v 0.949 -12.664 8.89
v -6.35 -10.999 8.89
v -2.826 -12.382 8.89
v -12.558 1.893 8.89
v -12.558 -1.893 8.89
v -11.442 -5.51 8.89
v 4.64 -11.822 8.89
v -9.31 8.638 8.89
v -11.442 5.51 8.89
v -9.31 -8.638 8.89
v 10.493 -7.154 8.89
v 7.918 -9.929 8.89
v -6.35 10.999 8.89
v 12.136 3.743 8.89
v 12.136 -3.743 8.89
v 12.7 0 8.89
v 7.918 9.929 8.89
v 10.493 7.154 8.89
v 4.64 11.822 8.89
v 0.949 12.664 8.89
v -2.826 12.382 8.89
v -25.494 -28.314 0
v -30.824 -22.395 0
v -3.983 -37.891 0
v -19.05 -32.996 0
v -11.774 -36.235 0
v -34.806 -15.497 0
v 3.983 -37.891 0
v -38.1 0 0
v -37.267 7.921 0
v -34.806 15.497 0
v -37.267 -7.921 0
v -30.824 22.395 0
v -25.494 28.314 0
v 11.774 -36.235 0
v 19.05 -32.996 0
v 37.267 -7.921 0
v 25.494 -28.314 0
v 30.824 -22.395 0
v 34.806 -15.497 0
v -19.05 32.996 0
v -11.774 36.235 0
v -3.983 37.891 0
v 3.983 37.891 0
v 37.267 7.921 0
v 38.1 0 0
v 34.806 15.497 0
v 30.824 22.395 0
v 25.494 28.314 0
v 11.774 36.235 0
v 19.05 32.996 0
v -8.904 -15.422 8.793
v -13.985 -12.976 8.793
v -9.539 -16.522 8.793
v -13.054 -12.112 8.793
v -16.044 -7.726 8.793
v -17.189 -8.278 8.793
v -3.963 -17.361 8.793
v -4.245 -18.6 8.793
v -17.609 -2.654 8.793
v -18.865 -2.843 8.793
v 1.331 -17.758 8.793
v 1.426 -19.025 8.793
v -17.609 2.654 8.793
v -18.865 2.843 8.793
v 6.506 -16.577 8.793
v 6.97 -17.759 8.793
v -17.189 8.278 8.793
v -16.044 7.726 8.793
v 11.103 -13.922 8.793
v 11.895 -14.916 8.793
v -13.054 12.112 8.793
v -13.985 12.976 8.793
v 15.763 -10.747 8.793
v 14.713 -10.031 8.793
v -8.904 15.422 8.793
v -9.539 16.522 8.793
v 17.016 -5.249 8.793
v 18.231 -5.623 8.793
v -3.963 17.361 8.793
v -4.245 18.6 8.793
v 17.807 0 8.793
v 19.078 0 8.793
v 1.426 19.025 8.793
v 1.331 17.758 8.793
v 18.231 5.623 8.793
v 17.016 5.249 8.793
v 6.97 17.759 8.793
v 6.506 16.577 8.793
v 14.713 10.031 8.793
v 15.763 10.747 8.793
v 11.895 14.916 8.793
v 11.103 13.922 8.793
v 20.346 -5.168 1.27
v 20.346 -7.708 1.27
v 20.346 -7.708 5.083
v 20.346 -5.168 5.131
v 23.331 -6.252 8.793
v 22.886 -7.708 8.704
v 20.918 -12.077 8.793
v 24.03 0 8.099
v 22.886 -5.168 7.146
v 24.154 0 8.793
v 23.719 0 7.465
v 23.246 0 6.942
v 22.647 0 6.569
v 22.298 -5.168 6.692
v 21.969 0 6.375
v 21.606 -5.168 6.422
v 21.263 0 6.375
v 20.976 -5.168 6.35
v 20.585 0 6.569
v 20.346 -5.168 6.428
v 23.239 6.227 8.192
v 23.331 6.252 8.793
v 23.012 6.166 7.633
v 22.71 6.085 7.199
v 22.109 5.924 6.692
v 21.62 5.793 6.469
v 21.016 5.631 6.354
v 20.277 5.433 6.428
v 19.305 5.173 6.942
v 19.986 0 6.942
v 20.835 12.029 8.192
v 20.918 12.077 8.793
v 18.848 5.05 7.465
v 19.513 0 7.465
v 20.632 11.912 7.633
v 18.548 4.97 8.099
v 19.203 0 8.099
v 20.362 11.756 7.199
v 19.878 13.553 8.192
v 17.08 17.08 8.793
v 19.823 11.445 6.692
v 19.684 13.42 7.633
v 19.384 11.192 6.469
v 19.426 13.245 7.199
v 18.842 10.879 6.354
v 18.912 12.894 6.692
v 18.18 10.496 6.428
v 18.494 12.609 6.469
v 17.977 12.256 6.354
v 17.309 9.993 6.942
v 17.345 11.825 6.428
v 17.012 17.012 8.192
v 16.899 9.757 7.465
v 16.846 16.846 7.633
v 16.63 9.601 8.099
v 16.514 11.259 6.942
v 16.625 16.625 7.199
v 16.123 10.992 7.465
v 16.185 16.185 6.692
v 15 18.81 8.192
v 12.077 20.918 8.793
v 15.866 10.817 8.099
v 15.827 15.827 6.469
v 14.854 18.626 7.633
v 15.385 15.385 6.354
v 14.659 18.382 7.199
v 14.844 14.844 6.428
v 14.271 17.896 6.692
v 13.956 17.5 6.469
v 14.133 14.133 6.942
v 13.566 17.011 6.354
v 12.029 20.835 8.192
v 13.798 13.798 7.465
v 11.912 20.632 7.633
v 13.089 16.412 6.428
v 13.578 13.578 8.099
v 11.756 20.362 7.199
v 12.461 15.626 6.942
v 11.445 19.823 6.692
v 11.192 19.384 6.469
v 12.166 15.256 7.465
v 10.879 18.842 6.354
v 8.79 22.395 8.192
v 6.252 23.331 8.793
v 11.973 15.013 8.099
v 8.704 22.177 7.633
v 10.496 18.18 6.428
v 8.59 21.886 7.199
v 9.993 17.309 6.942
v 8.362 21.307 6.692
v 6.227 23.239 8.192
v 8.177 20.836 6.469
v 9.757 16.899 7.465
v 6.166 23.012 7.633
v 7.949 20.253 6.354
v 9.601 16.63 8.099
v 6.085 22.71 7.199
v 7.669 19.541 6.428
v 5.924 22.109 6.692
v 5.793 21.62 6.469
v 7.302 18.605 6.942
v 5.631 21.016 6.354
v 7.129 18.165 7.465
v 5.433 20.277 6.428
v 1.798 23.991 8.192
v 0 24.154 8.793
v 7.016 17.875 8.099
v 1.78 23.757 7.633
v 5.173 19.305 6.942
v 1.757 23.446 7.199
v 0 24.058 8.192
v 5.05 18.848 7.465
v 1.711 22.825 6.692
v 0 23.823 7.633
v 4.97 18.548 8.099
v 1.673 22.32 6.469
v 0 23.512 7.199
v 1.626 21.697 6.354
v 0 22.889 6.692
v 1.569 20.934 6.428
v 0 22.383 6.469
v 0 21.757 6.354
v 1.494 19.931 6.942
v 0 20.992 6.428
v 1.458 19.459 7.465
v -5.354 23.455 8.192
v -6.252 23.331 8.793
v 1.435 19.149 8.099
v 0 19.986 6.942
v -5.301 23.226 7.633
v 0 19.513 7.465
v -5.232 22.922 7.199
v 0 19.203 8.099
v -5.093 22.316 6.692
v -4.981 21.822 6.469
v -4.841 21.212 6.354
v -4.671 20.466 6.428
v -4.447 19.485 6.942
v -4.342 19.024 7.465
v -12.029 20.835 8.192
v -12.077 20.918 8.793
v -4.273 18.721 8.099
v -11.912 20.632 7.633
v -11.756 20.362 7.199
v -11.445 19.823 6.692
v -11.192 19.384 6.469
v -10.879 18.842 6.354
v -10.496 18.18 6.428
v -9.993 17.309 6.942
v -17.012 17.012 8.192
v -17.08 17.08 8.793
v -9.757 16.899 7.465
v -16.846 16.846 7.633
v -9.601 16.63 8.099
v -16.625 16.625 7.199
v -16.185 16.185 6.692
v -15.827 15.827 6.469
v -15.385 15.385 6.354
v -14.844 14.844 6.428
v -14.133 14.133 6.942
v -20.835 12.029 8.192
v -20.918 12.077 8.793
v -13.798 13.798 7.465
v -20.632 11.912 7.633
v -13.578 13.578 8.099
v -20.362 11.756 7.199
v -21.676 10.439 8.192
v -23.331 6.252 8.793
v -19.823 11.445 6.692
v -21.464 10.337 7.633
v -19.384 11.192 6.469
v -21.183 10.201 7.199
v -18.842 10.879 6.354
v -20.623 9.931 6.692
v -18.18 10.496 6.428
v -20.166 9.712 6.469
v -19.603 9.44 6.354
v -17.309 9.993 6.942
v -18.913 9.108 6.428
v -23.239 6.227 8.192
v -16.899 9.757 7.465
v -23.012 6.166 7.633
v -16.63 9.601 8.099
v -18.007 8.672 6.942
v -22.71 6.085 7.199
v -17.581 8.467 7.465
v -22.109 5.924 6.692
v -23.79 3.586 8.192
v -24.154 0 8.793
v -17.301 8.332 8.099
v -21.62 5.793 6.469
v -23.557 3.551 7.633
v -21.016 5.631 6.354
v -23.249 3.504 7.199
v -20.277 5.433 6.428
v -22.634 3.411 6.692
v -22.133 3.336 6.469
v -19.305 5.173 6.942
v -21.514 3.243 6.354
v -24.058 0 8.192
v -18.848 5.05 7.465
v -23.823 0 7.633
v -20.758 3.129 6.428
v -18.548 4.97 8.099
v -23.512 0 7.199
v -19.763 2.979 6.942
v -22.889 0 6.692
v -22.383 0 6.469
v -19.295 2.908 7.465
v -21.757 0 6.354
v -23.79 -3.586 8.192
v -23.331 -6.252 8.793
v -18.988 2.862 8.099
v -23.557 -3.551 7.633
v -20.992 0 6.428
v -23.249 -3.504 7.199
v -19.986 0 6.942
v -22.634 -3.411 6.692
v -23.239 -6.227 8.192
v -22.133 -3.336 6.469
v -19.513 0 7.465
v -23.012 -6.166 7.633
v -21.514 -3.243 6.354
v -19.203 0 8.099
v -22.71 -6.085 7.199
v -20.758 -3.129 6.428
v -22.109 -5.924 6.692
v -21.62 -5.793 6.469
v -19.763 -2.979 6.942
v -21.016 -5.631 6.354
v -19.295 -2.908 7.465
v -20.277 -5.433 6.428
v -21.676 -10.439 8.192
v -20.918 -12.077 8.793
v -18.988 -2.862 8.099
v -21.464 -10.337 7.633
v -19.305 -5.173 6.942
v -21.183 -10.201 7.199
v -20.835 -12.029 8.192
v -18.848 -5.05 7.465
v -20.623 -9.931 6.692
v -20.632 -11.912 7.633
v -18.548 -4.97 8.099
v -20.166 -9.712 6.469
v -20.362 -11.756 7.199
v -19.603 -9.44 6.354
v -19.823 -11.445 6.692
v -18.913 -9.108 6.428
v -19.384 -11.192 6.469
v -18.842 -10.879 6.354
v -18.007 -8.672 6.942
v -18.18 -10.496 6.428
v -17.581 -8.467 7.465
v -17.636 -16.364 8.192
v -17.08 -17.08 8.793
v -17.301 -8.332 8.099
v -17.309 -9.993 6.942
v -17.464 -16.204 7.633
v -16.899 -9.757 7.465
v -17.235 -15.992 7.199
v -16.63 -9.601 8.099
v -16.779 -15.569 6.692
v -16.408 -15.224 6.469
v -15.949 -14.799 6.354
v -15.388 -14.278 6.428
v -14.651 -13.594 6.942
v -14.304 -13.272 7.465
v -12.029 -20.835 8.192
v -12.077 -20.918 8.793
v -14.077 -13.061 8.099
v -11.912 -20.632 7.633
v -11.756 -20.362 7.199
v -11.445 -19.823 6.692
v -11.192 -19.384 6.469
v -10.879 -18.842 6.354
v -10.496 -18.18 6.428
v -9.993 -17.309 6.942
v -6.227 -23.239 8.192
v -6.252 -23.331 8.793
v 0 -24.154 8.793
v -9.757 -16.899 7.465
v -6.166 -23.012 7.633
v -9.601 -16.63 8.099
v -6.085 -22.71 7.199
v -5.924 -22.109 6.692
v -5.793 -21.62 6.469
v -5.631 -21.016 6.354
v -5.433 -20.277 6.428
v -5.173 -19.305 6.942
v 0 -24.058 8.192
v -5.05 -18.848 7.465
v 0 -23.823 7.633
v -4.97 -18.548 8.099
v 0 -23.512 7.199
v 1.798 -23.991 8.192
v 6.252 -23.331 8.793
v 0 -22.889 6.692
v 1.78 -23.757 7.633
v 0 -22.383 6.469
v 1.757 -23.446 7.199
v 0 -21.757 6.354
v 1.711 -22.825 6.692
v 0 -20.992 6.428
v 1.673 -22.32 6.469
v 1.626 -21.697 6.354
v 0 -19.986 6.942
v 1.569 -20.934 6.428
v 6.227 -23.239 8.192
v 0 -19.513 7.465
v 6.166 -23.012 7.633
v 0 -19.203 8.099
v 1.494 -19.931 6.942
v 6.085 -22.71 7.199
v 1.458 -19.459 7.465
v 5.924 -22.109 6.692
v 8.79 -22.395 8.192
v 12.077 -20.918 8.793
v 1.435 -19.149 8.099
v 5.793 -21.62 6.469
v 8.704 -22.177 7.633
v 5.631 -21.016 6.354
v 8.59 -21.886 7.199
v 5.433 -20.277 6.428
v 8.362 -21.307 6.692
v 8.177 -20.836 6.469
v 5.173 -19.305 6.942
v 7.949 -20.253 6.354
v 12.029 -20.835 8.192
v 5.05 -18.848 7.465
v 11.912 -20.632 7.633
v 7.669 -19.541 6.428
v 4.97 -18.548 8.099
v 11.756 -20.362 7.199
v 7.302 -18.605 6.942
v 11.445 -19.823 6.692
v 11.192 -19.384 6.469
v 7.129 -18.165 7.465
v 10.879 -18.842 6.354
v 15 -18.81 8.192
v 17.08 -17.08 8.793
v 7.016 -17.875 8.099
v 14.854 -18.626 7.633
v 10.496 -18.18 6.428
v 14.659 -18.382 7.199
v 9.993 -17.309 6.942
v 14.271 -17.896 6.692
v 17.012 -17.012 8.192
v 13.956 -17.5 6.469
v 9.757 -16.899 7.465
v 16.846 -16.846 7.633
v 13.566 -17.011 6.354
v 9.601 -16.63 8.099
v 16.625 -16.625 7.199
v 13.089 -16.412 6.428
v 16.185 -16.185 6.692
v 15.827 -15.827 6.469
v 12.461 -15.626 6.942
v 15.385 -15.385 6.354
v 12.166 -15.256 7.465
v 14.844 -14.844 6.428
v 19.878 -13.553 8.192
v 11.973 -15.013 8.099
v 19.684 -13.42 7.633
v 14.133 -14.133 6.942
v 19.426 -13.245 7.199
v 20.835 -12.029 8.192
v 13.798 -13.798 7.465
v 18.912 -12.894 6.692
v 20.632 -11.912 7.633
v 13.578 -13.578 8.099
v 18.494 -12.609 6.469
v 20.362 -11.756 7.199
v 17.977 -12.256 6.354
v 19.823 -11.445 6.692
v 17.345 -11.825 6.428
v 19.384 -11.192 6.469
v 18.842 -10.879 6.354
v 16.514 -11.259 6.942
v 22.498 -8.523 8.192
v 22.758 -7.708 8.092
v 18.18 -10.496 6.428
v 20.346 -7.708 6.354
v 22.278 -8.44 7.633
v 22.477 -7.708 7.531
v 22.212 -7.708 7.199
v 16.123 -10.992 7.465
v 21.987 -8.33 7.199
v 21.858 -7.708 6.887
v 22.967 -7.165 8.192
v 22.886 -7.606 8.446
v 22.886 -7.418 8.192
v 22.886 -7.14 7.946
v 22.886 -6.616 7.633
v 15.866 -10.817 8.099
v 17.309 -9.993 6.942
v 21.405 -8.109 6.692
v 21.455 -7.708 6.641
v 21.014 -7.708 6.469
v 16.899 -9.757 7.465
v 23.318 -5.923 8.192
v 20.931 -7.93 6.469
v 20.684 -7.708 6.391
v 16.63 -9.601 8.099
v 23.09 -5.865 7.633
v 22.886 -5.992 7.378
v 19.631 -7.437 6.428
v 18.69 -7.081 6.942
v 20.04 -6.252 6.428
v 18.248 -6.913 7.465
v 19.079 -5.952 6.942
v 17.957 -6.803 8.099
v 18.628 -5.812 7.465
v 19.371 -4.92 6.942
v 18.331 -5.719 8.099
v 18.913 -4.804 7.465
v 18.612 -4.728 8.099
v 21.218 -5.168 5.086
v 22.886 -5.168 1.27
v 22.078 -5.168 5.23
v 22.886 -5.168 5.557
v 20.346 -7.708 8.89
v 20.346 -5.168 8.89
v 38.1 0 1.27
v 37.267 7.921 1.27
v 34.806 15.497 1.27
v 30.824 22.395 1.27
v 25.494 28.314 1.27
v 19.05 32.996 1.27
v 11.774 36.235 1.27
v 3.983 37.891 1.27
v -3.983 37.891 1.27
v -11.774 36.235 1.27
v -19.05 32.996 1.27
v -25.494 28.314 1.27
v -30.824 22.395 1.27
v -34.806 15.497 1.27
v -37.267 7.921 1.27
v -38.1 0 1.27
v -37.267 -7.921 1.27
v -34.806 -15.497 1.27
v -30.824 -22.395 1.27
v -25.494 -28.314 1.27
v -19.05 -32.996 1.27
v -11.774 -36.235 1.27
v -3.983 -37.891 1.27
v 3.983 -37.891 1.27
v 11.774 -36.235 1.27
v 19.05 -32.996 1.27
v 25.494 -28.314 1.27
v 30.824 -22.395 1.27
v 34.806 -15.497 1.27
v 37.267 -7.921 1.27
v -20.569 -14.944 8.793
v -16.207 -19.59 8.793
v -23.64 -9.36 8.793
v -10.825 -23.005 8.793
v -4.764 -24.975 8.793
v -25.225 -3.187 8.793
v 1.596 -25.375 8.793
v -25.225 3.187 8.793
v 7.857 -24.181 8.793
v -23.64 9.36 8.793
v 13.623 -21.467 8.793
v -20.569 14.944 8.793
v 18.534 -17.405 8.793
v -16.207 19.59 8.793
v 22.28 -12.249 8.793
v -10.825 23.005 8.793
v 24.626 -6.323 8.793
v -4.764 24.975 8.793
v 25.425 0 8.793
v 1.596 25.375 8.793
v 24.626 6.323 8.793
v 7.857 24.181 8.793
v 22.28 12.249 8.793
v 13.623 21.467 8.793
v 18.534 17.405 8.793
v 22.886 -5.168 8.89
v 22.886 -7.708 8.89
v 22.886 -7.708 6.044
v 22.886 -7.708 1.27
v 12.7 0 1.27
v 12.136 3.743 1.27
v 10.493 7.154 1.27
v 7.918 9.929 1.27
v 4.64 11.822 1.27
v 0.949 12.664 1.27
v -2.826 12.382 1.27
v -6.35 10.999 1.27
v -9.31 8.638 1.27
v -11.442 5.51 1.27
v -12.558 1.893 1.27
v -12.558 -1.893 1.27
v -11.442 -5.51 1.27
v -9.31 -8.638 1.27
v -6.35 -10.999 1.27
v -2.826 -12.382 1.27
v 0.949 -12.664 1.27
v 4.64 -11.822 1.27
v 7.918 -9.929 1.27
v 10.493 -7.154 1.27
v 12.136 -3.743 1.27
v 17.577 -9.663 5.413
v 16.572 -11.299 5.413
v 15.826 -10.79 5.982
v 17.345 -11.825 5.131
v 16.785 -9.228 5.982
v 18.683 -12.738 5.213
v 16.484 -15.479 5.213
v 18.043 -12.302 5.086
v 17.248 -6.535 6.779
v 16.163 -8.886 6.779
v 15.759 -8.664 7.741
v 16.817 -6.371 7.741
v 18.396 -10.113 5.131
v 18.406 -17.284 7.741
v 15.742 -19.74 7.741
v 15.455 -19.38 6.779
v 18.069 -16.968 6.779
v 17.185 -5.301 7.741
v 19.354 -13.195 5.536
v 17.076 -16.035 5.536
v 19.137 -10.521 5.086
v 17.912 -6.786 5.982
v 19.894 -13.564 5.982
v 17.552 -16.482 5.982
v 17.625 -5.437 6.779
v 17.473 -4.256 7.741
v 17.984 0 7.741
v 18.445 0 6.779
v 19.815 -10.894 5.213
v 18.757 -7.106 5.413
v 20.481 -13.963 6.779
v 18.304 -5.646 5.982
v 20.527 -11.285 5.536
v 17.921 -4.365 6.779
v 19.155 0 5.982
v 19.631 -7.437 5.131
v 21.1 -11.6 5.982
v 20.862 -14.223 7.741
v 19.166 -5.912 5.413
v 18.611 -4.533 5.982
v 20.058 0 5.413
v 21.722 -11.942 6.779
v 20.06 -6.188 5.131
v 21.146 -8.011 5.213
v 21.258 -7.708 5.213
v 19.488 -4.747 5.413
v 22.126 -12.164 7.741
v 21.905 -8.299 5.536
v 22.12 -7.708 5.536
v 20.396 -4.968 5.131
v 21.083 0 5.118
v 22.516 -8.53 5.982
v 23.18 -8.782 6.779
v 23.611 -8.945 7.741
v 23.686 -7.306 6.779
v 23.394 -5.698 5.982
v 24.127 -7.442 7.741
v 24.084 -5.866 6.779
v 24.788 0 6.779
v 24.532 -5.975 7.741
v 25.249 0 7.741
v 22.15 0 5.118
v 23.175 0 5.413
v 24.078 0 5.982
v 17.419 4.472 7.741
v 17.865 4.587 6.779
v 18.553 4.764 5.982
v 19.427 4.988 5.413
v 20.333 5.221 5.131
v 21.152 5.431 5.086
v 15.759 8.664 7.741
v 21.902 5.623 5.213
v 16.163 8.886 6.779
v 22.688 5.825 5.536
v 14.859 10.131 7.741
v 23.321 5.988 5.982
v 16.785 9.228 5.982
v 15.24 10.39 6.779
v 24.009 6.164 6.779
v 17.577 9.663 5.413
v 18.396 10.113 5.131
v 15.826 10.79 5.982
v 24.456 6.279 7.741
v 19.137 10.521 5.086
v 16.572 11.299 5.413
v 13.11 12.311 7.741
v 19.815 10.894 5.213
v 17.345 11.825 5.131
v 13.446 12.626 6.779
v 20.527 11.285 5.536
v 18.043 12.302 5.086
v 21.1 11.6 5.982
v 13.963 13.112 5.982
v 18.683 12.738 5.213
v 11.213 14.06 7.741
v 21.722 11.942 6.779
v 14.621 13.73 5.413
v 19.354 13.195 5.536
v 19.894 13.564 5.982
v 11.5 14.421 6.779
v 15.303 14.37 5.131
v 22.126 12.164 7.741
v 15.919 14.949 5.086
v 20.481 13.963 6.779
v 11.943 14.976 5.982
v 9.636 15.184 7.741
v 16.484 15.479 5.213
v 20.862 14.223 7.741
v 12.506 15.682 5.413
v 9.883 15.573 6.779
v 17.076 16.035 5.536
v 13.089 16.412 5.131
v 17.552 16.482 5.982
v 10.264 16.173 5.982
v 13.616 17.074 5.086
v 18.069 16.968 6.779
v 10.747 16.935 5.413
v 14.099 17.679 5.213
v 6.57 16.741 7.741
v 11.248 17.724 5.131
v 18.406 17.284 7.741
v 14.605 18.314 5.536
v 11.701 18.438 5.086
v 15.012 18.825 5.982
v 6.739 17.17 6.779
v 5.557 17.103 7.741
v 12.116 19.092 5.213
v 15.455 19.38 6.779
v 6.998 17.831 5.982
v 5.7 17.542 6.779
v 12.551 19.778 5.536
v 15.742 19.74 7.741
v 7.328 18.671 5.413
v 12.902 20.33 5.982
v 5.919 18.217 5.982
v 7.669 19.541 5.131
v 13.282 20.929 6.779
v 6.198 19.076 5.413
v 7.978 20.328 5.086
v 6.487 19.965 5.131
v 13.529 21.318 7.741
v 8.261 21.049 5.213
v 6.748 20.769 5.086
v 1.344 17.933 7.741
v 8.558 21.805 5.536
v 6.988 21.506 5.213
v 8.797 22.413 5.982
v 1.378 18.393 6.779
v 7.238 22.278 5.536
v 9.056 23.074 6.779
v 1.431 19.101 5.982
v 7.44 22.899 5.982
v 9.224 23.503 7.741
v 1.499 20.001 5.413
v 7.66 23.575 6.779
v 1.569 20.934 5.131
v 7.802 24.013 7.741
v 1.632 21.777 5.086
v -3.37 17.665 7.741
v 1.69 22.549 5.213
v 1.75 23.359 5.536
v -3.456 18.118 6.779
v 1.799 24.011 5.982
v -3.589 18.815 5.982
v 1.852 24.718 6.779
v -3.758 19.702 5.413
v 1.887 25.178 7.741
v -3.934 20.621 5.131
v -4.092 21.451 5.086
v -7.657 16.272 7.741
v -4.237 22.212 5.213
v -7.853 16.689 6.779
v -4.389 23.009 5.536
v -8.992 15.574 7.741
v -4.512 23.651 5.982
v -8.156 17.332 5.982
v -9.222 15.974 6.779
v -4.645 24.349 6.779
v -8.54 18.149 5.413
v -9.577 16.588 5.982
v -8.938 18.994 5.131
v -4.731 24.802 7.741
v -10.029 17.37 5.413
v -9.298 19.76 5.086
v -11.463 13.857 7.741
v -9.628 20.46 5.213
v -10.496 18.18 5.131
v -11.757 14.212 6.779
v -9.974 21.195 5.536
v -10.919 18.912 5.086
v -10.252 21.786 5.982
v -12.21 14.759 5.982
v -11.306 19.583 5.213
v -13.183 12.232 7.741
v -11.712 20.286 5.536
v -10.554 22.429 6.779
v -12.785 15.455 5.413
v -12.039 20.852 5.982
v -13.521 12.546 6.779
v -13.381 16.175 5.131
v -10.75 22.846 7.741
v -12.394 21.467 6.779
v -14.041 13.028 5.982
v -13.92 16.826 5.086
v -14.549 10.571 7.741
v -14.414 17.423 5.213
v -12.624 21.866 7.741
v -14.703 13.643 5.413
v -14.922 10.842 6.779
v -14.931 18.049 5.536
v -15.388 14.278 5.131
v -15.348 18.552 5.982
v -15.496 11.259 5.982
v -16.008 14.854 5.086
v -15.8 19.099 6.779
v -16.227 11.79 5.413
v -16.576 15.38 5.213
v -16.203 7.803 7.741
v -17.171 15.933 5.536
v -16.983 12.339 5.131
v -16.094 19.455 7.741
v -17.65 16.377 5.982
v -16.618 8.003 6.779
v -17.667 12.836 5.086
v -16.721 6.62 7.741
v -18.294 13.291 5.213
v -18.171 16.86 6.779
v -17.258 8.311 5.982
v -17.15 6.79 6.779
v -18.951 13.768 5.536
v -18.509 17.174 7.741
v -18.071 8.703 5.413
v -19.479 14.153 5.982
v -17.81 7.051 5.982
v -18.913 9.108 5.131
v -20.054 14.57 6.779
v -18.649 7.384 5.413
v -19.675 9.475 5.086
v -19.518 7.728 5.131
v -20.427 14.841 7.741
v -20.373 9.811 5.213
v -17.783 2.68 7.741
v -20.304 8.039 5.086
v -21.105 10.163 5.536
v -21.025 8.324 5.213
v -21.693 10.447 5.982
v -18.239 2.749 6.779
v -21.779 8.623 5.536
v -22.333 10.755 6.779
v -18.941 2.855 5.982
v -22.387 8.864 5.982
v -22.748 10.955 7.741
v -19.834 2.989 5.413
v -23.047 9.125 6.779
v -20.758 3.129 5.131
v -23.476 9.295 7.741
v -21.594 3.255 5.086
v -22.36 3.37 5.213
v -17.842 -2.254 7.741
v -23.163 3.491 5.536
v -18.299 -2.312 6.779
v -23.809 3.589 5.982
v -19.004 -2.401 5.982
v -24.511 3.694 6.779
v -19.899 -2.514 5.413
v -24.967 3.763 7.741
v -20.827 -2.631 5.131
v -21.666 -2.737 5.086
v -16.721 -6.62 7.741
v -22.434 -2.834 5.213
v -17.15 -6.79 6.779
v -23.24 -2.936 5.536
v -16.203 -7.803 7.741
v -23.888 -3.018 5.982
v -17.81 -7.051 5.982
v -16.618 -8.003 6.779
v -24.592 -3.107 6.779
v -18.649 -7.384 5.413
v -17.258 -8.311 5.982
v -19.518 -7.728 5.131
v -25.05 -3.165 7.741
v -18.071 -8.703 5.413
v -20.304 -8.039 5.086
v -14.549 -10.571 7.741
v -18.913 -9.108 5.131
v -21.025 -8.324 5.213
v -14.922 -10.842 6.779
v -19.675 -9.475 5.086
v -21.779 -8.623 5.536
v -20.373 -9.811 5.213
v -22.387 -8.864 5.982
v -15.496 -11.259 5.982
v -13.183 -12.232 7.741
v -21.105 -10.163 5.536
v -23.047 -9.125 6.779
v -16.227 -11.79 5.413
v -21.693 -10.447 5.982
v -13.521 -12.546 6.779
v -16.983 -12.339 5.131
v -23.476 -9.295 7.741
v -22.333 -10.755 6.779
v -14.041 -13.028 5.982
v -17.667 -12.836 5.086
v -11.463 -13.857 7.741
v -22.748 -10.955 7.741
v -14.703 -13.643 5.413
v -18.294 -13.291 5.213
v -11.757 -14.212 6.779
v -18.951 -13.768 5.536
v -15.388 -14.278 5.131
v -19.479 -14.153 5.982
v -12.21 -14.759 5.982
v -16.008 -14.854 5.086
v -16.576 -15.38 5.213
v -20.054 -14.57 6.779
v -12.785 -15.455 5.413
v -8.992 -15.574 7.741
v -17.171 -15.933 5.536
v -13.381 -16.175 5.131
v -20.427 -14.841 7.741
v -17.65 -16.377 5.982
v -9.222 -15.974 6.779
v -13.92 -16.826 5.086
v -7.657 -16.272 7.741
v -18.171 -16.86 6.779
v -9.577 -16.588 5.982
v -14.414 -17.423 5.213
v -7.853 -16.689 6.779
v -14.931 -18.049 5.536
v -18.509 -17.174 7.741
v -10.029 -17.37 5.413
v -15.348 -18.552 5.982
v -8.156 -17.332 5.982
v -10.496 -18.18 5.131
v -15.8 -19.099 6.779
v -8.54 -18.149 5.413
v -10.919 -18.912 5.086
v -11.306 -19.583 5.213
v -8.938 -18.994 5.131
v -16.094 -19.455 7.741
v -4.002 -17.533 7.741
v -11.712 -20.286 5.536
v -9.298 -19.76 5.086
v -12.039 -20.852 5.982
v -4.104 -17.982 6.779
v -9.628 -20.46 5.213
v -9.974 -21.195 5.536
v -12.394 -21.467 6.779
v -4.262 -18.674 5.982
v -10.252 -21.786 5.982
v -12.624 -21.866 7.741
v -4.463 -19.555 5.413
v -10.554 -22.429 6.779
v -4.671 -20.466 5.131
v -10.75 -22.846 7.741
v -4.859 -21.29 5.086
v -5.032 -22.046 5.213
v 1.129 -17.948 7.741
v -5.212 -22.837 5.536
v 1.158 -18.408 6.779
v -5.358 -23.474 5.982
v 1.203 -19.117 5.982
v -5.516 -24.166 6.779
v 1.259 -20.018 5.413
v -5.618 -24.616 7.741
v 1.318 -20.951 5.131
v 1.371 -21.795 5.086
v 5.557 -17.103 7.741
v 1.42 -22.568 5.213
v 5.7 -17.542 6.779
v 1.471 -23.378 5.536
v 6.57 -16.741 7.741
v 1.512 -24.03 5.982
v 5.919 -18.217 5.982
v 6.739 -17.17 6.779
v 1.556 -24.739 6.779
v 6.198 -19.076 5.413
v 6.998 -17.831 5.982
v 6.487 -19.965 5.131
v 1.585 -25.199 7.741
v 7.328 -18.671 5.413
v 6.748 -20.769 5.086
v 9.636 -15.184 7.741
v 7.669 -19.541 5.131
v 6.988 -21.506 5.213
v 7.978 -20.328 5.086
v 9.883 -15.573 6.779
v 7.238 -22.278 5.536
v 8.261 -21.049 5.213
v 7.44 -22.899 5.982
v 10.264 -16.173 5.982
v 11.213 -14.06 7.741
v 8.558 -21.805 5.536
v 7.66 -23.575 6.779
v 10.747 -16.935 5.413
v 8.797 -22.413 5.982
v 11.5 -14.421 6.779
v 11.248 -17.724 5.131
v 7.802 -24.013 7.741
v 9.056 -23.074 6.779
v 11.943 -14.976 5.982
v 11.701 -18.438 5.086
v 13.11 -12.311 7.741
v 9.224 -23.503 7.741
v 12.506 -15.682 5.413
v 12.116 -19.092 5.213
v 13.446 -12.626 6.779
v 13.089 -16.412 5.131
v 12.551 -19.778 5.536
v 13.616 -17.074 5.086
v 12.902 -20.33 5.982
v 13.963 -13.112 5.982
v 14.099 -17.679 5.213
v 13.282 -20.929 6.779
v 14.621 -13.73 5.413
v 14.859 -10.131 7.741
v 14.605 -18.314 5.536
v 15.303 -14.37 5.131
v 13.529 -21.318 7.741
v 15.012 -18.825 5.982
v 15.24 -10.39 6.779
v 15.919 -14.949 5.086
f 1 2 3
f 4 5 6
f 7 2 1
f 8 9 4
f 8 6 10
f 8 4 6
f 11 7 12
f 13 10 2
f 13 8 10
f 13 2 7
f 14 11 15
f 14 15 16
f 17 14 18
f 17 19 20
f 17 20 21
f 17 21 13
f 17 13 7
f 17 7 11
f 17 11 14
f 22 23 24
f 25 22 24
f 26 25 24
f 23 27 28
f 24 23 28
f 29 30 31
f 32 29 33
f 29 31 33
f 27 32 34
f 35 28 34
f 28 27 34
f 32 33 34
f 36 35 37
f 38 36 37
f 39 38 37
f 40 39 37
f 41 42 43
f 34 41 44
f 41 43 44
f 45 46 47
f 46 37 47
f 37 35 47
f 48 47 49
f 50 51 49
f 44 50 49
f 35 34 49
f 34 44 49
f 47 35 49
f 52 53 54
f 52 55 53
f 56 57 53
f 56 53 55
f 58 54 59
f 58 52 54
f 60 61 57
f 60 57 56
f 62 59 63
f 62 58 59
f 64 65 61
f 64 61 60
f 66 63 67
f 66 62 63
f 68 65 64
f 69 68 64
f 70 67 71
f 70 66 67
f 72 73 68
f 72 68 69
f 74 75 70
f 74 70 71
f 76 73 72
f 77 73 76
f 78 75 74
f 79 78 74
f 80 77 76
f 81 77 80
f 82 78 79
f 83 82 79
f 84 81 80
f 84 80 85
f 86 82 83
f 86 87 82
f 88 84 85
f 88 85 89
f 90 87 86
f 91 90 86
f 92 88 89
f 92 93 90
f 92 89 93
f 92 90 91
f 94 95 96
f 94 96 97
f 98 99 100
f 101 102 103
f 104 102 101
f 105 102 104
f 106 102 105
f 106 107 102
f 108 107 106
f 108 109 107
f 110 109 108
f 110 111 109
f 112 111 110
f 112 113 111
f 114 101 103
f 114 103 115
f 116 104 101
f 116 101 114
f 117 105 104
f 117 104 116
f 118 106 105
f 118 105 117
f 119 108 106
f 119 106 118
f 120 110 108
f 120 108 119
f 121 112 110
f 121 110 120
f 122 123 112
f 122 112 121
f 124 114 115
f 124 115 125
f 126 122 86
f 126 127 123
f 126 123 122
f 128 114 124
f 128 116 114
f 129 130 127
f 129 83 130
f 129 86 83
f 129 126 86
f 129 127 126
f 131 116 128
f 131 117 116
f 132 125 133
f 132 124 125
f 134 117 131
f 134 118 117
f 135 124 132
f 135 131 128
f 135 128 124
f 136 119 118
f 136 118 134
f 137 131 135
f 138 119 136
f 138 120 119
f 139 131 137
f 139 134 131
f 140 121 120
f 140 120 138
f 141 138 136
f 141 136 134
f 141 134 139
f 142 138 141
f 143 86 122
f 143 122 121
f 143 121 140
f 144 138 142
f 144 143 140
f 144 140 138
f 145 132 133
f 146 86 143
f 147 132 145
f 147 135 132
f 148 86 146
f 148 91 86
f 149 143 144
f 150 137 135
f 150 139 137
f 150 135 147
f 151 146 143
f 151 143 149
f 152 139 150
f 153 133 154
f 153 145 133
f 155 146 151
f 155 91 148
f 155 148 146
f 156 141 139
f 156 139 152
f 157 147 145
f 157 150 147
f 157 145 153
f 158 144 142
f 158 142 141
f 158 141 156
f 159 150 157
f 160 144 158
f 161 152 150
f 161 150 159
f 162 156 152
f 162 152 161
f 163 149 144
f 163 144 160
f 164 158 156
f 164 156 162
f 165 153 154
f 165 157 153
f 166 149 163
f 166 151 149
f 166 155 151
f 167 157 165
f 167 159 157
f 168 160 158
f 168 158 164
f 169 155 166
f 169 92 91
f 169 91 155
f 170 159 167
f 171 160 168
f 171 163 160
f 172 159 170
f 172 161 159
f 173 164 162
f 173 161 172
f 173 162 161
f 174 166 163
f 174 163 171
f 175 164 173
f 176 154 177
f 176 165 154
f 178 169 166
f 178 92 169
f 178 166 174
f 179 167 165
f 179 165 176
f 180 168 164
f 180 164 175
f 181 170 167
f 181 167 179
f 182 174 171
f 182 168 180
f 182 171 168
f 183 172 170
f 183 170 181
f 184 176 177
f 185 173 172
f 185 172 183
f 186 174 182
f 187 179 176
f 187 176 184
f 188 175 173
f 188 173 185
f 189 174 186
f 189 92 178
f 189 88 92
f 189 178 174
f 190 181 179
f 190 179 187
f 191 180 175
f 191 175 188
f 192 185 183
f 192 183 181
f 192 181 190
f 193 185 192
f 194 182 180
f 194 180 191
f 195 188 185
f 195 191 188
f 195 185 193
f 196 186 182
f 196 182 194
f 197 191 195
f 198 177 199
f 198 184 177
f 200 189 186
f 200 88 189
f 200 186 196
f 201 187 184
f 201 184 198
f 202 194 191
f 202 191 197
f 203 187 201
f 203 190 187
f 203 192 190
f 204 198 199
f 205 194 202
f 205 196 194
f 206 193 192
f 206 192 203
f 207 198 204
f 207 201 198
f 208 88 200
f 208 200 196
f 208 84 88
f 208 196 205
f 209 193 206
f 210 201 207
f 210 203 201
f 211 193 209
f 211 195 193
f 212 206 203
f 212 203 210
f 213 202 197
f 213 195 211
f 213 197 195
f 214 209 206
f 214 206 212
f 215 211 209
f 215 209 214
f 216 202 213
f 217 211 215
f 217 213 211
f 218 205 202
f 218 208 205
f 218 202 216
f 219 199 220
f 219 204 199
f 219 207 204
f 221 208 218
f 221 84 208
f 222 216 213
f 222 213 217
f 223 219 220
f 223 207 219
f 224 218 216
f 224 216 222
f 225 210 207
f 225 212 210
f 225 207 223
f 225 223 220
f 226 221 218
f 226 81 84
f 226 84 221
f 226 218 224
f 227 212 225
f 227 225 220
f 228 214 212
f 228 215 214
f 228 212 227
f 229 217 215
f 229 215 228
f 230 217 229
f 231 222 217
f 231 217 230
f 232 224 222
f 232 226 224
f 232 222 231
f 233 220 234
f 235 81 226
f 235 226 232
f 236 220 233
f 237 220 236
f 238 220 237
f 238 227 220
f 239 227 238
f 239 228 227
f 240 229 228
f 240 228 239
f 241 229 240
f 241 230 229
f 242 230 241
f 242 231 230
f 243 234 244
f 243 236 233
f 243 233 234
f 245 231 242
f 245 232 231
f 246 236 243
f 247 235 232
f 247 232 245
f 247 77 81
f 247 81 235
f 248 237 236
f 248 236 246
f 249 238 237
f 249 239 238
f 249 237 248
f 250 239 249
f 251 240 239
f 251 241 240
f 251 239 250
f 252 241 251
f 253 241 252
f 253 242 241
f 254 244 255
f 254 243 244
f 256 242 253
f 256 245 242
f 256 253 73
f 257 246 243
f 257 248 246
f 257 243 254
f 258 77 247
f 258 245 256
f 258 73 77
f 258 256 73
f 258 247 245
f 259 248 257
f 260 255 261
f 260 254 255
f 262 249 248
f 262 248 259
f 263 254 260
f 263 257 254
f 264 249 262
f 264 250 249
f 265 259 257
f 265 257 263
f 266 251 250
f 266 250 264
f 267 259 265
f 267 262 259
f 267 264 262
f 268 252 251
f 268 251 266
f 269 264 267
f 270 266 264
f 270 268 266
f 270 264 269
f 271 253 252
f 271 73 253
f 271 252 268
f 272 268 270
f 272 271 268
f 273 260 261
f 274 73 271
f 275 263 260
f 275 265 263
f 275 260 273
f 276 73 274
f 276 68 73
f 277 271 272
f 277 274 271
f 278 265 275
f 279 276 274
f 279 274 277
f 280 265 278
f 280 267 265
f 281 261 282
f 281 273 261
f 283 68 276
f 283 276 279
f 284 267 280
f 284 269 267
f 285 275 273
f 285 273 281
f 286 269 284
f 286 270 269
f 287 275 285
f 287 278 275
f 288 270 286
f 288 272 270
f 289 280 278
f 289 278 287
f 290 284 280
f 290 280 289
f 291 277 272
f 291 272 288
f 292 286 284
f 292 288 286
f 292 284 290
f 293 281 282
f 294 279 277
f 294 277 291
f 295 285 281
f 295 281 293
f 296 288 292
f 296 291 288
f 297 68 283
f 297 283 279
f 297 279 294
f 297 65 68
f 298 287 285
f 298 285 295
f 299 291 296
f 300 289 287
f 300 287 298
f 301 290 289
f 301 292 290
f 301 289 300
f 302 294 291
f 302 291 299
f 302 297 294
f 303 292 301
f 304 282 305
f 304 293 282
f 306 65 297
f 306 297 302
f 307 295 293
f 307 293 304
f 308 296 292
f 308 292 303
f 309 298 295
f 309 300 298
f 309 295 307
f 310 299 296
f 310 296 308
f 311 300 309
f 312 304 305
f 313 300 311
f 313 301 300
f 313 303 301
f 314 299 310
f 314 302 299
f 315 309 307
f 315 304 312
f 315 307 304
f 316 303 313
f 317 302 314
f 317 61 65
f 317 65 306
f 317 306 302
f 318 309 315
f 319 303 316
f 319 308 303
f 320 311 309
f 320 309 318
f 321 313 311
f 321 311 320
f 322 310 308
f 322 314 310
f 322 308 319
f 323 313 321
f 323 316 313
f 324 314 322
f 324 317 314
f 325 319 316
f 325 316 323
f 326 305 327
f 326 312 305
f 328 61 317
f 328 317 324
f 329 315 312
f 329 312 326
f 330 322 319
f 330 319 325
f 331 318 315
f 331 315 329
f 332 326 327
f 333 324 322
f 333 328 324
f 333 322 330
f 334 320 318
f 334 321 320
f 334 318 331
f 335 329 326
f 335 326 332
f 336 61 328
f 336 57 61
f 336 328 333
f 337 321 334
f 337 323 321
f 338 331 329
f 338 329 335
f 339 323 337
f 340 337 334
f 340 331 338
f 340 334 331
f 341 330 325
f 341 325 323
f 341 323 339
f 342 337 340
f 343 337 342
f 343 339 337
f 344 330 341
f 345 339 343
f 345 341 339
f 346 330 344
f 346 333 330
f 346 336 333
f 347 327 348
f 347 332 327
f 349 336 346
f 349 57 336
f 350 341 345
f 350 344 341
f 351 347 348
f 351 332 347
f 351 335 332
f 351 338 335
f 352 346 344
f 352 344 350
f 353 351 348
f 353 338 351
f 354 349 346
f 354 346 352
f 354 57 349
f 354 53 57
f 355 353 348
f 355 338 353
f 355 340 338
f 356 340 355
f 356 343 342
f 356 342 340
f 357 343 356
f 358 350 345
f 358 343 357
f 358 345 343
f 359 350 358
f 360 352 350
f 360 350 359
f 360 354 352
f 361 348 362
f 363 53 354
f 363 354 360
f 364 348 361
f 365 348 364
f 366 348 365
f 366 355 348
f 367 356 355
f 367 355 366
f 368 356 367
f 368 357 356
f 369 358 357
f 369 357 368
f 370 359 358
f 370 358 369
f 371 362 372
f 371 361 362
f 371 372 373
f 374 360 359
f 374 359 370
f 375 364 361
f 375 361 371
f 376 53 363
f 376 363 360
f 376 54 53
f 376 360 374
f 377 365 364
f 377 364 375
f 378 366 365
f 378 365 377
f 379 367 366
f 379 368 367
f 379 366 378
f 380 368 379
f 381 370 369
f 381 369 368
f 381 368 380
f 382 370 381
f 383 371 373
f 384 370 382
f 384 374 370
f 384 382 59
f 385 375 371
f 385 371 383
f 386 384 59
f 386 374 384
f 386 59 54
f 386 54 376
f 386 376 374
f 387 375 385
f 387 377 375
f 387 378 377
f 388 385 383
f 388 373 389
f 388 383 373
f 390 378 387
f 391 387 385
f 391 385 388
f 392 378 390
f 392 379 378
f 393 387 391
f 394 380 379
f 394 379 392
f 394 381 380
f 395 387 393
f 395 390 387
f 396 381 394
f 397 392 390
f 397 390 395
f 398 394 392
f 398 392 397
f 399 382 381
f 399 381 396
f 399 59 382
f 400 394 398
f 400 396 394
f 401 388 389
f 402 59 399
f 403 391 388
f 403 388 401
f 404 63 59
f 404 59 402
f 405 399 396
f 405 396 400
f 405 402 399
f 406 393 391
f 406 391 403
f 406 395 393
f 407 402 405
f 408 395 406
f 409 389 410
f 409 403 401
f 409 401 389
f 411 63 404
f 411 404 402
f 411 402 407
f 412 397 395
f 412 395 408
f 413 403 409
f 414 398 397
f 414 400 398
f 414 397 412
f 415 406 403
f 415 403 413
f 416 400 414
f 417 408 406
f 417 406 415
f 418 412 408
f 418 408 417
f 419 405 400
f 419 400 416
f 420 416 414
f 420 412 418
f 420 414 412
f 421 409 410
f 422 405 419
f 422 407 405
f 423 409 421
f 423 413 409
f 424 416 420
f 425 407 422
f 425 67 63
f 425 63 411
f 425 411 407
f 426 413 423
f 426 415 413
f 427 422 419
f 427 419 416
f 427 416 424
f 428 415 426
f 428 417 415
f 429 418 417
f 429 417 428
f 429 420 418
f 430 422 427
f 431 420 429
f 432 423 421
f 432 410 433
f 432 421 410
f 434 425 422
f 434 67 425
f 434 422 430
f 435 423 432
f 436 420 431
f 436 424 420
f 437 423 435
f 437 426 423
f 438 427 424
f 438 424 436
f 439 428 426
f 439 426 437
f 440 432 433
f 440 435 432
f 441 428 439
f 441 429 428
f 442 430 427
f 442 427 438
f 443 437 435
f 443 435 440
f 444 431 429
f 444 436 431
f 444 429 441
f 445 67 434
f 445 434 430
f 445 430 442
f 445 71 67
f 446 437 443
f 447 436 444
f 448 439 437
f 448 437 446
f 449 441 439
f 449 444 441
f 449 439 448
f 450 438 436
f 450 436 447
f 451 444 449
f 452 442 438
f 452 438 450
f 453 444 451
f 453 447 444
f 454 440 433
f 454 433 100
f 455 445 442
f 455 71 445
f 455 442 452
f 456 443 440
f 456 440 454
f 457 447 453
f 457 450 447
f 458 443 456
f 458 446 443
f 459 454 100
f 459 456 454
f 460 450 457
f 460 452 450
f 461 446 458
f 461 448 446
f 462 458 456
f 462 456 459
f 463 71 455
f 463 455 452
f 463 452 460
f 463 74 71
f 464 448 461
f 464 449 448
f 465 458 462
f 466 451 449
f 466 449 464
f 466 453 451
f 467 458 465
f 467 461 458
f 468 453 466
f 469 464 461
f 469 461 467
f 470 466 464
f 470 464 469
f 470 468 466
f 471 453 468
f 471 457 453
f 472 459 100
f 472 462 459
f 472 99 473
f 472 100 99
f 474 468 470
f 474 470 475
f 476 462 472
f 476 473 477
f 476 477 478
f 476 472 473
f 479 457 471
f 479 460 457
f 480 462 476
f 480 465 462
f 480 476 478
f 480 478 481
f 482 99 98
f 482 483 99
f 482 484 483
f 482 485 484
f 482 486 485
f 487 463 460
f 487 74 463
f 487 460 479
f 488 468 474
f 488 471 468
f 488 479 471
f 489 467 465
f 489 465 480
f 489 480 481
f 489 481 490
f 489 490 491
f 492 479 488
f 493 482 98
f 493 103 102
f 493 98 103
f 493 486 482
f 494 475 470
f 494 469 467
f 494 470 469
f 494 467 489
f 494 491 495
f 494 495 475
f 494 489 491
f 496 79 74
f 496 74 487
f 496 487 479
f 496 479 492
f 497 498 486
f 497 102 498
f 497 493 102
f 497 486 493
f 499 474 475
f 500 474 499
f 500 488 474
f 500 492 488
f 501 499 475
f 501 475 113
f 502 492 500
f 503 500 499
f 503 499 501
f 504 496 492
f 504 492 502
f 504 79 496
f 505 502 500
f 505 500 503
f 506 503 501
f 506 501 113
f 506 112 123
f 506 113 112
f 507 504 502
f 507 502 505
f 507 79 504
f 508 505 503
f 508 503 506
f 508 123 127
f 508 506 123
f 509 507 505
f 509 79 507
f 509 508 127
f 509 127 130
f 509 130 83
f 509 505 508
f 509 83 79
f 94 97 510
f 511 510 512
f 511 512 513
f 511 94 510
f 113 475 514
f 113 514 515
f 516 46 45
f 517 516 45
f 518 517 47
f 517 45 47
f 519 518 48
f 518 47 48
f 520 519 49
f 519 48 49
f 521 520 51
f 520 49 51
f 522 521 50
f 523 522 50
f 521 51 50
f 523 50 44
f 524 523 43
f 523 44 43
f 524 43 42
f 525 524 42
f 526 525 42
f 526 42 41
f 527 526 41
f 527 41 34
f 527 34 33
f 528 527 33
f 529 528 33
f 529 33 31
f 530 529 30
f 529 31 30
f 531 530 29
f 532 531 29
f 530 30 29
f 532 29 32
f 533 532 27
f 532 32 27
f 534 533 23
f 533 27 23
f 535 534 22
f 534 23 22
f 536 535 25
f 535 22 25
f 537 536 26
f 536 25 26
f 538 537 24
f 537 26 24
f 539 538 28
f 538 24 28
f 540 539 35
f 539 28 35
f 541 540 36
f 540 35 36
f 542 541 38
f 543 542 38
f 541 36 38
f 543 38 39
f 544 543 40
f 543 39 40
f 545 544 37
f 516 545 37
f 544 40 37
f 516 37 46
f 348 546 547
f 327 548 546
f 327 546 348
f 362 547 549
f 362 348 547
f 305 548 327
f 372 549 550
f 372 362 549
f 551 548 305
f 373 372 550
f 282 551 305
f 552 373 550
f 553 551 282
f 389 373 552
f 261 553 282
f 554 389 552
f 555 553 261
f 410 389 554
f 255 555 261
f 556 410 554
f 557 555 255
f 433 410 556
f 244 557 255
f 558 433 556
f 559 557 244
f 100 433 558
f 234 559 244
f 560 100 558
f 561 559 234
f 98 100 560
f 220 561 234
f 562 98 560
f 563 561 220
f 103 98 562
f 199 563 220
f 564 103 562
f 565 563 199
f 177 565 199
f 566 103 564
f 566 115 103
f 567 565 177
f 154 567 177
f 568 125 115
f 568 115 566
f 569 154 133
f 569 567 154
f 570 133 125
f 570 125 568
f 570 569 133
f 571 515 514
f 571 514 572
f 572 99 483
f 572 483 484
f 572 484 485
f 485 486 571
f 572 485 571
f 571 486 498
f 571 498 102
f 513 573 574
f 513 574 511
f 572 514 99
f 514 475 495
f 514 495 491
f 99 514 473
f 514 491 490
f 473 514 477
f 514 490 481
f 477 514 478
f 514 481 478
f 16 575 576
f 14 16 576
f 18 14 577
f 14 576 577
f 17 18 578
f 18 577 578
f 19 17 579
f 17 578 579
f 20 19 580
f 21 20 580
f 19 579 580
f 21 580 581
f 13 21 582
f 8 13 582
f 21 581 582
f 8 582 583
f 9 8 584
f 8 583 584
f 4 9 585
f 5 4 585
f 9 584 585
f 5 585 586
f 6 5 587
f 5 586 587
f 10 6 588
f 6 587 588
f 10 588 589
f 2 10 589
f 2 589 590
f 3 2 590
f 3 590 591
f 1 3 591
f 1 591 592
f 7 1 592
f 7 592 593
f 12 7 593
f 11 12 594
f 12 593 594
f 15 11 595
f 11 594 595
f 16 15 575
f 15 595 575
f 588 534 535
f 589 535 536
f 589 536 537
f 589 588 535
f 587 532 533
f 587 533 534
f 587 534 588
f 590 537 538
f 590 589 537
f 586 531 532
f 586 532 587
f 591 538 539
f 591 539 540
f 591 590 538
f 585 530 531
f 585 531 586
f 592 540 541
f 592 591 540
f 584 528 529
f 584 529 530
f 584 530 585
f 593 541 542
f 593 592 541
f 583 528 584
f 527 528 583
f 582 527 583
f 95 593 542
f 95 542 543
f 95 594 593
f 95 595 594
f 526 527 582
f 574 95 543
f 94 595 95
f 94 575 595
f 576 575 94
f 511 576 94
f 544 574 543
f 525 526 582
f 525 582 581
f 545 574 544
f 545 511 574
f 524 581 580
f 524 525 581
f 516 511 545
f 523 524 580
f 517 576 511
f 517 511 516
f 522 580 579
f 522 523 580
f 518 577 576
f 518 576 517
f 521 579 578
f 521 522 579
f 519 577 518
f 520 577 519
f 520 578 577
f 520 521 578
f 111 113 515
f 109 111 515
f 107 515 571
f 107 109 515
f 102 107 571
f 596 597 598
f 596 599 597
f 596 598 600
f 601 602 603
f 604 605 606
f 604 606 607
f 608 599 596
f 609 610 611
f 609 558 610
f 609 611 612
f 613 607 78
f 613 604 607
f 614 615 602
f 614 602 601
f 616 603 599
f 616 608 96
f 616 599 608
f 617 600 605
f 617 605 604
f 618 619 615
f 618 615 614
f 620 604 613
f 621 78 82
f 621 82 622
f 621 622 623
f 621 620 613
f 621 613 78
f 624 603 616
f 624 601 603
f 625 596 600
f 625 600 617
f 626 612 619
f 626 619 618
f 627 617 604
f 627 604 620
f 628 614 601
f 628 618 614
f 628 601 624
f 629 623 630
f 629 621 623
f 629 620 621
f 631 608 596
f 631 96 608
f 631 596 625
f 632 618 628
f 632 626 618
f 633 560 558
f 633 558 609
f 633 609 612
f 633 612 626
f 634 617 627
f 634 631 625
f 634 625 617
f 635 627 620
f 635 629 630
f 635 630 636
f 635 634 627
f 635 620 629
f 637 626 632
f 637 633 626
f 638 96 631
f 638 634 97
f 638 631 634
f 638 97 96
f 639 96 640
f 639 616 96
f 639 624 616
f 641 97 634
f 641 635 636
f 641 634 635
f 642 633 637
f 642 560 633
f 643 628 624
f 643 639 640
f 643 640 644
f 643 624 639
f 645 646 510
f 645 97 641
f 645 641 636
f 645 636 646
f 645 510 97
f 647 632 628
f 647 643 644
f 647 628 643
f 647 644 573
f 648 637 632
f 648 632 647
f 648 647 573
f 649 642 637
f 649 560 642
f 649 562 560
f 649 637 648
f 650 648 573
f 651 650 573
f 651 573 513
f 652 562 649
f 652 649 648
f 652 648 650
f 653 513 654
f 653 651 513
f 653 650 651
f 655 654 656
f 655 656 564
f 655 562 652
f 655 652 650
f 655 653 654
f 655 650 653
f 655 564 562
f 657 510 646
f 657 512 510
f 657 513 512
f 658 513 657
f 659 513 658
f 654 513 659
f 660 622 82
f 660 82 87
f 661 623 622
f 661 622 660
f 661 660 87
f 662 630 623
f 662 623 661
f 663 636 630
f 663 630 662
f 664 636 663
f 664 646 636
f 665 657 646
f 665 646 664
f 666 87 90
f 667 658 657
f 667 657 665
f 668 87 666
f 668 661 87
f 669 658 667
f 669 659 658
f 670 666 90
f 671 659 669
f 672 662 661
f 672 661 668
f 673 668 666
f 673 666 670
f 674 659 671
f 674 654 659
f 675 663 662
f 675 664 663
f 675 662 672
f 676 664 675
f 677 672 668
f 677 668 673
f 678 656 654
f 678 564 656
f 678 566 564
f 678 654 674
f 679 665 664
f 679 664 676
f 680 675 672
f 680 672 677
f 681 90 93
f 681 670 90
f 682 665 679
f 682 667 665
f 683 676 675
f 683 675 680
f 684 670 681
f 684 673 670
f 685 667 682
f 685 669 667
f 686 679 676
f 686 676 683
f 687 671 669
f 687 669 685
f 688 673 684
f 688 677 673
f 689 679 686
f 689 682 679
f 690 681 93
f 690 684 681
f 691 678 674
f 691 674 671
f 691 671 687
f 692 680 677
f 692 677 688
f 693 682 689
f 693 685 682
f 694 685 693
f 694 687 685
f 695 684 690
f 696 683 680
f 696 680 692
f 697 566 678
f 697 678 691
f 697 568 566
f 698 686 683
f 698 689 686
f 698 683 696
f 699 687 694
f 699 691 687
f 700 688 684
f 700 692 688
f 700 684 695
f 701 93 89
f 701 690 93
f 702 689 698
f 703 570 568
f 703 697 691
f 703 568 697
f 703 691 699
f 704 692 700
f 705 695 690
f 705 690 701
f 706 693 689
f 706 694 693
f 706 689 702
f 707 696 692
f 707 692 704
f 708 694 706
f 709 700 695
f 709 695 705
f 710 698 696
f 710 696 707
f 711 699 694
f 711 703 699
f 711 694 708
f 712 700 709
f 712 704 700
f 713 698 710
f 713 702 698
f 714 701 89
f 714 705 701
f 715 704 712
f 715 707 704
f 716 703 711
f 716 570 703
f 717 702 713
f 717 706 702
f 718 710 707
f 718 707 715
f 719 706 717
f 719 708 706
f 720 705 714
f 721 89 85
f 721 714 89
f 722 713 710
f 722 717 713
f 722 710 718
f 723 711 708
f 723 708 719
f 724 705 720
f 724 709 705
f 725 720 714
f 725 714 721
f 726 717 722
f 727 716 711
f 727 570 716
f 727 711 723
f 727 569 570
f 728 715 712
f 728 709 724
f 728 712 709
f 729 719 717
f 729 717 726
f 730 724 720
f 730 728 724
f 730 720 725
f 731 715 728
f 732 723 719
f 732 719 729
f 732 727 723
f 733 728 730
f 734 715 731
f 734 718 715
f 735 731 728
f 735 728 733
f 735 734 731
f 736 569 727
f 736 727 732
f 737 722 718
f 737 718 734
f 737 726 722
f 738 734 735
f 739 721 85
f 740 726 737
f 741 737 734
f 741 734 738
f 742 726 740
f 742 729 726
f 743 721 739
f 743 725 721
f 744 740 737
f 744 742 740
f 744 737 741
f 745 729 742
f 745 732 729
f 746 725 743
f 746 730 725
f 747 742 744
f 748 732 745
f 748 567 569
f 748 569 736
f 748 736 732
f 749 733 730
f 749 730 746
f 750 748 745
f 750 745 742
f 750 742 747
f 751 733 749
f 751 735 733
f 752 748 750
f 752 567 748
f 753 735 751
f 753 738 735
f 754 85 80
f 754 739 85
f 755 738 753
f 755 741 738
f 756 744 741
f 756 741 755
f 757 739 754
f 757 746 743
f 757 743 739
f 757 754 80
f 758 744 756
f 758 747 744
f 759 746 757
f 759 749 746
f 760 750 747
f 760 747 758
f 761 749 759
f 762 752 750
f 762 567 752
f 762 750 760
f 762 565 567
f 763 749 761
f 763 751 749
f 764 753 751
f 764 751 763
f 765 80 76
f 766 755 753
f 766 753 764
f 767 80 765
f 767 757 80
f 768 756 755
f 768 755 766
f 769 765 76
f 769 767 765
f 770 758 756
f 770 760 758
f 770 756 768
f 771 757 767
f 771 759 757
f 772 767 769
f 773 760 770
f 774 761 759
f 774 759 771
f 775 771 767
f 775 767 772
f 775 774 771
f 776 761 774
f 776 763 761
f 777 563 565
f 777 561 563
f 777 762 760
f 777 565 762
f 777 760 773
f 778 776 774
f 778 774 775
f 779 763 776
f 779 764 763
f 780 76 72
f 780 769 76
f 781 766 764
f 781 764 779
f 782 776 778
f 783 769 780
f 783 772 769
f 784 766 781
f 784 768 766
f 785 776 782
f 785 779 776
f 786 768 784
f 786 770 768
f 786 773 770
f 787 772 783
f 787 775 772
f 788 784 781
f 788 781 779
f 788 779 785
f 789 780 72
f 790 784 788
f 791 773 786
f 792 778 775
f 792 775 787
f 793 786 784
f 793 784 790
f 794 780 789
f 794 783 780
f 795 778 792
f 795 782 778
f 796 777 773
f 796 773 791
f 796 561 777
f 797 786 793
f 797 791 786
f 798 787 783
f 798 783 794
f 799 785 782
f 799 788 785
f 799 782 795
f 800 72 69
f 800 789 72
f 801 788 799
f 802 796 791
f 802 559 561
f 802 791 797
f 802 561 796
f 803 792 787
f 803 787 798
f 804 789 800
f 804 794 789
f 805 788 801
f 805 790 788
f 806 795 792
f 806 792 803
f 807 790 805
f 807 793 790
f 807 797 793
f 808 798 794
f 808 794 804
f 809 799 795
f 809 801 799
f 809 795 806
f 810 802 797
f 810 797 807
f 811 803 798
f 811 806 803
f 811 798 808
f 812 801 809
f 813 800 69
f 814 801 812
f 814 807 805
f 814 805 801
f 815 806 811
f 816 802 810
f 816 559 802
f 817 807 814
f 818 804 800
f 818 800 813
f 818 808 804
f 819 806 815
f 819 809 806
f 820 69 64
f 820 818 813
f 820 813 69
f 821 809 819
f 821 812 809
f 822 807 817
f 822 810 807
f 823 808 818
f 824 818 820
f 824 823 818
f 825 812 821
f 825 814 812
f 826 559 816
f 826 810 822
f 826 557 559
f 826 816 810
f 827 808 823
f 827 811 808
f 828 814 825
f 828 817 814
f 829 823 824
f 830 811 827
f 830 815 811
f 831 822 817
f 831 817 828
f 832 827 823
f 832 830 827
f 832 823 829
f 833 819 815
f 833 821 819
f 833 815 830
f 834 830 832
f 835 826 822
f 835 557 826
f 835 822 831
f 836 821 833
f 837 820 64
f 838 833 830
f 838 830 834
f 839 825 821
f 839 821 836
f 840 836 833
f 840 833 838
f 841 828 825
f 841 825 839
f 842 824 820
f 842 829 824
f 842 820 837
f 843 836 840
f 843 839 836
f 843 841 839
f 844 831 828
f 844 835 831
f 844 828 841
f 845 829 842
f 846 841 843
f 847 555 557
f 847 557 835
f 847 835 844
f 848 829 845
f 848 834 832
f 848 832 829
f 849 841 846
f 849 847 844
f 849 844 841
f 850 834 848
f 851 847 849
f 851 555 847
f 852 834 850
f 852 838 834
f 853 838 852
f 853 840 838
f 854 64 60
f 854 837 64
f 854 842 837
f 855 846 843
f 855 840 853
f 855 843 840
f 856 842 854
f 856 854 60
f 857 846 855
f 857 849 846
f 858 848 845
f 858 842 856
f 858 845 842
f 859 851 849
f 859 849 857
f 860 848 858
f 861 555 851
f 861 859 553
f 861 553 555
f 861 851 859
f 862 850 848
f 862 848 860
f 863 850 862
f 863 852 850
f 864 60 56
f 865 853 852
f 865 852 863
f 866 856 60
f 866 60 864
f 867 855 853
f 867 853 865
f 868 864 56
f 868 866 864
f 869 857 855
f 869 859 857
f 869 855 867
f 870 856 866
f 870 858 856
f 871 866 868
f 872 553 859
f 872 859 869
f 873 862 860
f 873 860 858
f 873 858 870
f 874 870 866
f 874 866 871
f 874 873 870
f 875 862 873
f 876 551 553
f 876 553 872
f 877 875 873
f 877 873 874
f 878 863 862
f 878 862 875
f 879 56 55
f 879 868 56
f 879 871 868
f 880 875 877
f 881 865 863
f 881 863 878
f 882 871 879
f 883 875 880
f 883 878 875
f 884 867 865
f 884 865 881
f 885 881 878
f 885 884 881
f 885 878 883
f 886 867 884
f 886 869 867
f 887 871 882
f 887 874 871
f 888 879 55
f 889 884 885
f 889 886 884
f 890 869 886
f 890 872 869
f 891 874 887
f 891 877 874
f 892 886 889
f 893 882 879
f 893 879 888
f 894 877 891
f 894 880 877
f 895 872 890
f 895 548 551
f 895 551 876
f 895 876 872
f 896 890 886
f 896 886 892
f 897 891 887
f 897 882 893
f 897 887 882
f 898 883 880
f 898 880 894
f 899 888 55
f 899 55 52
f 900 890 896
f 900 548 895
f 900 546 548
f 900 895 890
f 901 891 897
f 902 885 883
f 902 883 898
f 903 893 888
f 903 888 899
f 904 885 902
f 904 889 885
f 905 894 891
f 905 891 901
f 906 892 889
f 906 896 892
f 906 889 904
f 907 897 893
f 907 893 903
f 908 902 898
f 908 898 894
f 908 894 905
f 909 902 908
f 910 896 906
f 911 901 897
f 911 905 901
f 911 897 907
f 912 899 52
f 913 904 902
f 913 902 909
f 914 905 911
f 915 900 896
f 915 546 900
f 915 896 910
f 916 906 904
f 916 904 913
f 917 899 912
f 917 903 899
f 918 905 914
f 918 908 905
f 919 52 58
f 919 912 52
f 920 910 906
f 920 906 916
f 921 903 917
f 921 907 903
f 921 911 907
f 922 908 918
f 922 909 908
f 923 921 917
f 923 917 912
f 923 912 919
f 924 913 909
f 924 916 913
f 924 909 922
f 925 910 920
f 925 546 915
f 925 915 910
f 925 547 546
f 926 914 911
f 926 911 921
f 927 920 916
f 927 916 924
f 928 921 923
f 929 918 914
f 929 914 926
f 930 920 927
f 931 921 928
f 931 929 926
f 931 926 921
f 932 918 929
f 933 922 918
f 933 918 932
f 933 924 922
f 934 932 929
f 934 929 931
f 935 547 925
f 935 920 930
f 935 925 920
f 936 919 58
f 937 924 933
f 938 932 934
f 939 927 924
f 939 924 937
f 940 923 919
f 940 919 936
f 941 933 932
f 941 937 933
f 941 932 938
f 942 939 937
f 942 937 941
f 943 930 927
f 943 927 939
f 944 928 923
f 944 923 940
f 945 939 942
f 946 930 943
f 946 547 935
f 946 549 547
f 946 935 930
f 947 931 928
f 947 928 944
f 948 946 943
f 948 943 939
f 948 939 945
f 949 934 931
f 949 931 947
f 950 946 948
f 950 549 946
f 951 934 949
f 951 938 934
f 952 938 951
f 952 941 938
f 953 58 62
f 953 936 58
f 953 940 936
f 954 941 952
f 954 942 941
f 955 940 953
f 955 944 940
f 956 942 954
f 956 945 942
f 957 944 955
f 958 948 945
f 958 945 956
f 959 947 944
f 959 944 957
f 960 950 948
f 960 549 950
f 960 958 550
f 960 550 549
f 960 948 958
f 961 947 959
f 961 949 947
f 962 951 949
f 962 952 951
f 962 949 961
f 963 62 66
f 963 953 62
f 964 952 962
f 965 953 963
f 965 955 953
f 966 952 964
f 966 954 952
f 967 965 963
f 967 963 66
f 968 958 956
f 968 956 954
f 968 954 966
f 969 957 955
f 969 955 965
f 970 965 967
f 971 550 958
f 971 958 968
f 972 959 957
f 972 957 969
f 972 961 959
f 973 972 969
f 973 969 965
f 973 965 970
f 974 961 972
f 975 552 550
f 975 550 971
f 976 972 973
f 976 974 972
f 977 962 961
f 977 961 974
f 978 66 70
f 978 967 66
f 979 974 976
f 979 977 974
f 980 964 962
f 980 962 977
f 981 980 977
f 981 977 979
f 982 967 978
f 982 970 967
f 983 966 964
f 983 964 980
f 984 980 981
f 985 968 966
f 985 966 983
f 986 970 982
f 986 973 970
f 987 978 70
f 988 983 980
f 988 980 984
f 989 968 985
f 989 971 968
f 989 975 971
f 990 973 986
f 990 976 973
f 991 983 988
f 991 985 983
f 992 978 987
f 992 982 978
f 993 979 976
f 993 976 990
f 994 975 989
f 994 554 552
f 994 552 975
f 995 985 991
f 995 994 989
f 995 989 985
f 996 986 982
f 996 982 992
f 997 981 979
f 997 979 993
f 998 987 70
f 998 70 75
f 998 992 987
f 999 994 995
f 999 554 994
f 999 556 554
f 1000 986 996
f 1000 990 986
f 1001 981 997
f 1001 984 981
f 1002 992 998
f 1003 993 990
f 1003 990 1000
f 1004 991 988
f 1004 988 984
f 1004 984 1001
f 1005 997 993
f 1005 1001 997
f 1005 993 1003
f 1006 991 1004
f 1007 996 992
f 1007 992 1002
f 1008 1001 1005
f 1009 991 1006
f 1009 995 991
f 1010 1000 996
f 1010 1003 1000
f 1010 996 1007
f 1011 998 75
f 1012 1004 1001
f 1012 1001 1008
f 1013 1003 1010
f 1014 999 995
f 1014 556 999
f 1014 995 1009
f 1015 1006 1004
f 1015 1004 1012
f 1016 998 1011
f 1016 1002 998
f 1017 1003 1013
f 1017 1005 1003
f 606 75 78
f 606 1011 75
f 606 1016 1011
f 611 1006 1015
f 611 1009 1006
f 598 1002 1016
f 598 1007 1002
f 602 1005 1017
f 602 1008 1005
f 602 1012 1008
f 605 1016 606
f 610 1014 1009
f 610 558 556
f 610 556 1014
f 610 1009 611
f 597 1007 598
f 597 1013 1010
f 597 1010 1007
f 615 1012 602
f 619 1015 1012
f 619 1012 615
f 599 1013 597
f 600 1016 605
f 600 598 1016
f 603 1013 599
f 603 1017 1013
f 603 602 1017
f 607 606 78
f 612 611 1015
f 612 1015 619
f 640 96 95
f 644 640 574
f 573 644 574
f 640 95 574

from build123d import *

# Parameters (mm, degrees)
F0_R     = 38.1
F1_DEPTH = 1.27
F2_W     = 2.54
F2_H     = 2.54
F2_R     = 12.7
F3_DEPTH = 7.62


with BuildPart() as f1:
    # F0 (on Top) → F1 (new body)
    with BuildSketch(Plane.XY):
        Circle(F0_R)
    extrude(amount=F1_DEPTH)

    # F2 (on face) → F3 (join)
    with BuildSketch(Plane.XY.offset(1.27)):
        with Locations((21.616246, -6.438158)):
            Rectangle(F2_W, F2_H)
        Circle(F2_R)
    extrude(amount=F3_DEPTH)

    # F4 (on Front) → F5 (revolve)
    with BuildSketch(Plane.XZ):
        with BuildLine():
            Line((19.07809, 8.793222), (17.807475, 8.793222))
            ThreePointArc((17.807475, 8.793222), (21.616246, 5.08), (25.425016, 8.793222))
            Line((25.425016, 8.793222), (24.154401, 8.793222))
            ThreePointArc((24.154401, 8.793222), (21.616246, 6.35), (19.07809, 8.793222))
        make_face()
    revolve(axis=Axis((0, 0, 8.89), (0, 0, 1)))


solid = f1.part
